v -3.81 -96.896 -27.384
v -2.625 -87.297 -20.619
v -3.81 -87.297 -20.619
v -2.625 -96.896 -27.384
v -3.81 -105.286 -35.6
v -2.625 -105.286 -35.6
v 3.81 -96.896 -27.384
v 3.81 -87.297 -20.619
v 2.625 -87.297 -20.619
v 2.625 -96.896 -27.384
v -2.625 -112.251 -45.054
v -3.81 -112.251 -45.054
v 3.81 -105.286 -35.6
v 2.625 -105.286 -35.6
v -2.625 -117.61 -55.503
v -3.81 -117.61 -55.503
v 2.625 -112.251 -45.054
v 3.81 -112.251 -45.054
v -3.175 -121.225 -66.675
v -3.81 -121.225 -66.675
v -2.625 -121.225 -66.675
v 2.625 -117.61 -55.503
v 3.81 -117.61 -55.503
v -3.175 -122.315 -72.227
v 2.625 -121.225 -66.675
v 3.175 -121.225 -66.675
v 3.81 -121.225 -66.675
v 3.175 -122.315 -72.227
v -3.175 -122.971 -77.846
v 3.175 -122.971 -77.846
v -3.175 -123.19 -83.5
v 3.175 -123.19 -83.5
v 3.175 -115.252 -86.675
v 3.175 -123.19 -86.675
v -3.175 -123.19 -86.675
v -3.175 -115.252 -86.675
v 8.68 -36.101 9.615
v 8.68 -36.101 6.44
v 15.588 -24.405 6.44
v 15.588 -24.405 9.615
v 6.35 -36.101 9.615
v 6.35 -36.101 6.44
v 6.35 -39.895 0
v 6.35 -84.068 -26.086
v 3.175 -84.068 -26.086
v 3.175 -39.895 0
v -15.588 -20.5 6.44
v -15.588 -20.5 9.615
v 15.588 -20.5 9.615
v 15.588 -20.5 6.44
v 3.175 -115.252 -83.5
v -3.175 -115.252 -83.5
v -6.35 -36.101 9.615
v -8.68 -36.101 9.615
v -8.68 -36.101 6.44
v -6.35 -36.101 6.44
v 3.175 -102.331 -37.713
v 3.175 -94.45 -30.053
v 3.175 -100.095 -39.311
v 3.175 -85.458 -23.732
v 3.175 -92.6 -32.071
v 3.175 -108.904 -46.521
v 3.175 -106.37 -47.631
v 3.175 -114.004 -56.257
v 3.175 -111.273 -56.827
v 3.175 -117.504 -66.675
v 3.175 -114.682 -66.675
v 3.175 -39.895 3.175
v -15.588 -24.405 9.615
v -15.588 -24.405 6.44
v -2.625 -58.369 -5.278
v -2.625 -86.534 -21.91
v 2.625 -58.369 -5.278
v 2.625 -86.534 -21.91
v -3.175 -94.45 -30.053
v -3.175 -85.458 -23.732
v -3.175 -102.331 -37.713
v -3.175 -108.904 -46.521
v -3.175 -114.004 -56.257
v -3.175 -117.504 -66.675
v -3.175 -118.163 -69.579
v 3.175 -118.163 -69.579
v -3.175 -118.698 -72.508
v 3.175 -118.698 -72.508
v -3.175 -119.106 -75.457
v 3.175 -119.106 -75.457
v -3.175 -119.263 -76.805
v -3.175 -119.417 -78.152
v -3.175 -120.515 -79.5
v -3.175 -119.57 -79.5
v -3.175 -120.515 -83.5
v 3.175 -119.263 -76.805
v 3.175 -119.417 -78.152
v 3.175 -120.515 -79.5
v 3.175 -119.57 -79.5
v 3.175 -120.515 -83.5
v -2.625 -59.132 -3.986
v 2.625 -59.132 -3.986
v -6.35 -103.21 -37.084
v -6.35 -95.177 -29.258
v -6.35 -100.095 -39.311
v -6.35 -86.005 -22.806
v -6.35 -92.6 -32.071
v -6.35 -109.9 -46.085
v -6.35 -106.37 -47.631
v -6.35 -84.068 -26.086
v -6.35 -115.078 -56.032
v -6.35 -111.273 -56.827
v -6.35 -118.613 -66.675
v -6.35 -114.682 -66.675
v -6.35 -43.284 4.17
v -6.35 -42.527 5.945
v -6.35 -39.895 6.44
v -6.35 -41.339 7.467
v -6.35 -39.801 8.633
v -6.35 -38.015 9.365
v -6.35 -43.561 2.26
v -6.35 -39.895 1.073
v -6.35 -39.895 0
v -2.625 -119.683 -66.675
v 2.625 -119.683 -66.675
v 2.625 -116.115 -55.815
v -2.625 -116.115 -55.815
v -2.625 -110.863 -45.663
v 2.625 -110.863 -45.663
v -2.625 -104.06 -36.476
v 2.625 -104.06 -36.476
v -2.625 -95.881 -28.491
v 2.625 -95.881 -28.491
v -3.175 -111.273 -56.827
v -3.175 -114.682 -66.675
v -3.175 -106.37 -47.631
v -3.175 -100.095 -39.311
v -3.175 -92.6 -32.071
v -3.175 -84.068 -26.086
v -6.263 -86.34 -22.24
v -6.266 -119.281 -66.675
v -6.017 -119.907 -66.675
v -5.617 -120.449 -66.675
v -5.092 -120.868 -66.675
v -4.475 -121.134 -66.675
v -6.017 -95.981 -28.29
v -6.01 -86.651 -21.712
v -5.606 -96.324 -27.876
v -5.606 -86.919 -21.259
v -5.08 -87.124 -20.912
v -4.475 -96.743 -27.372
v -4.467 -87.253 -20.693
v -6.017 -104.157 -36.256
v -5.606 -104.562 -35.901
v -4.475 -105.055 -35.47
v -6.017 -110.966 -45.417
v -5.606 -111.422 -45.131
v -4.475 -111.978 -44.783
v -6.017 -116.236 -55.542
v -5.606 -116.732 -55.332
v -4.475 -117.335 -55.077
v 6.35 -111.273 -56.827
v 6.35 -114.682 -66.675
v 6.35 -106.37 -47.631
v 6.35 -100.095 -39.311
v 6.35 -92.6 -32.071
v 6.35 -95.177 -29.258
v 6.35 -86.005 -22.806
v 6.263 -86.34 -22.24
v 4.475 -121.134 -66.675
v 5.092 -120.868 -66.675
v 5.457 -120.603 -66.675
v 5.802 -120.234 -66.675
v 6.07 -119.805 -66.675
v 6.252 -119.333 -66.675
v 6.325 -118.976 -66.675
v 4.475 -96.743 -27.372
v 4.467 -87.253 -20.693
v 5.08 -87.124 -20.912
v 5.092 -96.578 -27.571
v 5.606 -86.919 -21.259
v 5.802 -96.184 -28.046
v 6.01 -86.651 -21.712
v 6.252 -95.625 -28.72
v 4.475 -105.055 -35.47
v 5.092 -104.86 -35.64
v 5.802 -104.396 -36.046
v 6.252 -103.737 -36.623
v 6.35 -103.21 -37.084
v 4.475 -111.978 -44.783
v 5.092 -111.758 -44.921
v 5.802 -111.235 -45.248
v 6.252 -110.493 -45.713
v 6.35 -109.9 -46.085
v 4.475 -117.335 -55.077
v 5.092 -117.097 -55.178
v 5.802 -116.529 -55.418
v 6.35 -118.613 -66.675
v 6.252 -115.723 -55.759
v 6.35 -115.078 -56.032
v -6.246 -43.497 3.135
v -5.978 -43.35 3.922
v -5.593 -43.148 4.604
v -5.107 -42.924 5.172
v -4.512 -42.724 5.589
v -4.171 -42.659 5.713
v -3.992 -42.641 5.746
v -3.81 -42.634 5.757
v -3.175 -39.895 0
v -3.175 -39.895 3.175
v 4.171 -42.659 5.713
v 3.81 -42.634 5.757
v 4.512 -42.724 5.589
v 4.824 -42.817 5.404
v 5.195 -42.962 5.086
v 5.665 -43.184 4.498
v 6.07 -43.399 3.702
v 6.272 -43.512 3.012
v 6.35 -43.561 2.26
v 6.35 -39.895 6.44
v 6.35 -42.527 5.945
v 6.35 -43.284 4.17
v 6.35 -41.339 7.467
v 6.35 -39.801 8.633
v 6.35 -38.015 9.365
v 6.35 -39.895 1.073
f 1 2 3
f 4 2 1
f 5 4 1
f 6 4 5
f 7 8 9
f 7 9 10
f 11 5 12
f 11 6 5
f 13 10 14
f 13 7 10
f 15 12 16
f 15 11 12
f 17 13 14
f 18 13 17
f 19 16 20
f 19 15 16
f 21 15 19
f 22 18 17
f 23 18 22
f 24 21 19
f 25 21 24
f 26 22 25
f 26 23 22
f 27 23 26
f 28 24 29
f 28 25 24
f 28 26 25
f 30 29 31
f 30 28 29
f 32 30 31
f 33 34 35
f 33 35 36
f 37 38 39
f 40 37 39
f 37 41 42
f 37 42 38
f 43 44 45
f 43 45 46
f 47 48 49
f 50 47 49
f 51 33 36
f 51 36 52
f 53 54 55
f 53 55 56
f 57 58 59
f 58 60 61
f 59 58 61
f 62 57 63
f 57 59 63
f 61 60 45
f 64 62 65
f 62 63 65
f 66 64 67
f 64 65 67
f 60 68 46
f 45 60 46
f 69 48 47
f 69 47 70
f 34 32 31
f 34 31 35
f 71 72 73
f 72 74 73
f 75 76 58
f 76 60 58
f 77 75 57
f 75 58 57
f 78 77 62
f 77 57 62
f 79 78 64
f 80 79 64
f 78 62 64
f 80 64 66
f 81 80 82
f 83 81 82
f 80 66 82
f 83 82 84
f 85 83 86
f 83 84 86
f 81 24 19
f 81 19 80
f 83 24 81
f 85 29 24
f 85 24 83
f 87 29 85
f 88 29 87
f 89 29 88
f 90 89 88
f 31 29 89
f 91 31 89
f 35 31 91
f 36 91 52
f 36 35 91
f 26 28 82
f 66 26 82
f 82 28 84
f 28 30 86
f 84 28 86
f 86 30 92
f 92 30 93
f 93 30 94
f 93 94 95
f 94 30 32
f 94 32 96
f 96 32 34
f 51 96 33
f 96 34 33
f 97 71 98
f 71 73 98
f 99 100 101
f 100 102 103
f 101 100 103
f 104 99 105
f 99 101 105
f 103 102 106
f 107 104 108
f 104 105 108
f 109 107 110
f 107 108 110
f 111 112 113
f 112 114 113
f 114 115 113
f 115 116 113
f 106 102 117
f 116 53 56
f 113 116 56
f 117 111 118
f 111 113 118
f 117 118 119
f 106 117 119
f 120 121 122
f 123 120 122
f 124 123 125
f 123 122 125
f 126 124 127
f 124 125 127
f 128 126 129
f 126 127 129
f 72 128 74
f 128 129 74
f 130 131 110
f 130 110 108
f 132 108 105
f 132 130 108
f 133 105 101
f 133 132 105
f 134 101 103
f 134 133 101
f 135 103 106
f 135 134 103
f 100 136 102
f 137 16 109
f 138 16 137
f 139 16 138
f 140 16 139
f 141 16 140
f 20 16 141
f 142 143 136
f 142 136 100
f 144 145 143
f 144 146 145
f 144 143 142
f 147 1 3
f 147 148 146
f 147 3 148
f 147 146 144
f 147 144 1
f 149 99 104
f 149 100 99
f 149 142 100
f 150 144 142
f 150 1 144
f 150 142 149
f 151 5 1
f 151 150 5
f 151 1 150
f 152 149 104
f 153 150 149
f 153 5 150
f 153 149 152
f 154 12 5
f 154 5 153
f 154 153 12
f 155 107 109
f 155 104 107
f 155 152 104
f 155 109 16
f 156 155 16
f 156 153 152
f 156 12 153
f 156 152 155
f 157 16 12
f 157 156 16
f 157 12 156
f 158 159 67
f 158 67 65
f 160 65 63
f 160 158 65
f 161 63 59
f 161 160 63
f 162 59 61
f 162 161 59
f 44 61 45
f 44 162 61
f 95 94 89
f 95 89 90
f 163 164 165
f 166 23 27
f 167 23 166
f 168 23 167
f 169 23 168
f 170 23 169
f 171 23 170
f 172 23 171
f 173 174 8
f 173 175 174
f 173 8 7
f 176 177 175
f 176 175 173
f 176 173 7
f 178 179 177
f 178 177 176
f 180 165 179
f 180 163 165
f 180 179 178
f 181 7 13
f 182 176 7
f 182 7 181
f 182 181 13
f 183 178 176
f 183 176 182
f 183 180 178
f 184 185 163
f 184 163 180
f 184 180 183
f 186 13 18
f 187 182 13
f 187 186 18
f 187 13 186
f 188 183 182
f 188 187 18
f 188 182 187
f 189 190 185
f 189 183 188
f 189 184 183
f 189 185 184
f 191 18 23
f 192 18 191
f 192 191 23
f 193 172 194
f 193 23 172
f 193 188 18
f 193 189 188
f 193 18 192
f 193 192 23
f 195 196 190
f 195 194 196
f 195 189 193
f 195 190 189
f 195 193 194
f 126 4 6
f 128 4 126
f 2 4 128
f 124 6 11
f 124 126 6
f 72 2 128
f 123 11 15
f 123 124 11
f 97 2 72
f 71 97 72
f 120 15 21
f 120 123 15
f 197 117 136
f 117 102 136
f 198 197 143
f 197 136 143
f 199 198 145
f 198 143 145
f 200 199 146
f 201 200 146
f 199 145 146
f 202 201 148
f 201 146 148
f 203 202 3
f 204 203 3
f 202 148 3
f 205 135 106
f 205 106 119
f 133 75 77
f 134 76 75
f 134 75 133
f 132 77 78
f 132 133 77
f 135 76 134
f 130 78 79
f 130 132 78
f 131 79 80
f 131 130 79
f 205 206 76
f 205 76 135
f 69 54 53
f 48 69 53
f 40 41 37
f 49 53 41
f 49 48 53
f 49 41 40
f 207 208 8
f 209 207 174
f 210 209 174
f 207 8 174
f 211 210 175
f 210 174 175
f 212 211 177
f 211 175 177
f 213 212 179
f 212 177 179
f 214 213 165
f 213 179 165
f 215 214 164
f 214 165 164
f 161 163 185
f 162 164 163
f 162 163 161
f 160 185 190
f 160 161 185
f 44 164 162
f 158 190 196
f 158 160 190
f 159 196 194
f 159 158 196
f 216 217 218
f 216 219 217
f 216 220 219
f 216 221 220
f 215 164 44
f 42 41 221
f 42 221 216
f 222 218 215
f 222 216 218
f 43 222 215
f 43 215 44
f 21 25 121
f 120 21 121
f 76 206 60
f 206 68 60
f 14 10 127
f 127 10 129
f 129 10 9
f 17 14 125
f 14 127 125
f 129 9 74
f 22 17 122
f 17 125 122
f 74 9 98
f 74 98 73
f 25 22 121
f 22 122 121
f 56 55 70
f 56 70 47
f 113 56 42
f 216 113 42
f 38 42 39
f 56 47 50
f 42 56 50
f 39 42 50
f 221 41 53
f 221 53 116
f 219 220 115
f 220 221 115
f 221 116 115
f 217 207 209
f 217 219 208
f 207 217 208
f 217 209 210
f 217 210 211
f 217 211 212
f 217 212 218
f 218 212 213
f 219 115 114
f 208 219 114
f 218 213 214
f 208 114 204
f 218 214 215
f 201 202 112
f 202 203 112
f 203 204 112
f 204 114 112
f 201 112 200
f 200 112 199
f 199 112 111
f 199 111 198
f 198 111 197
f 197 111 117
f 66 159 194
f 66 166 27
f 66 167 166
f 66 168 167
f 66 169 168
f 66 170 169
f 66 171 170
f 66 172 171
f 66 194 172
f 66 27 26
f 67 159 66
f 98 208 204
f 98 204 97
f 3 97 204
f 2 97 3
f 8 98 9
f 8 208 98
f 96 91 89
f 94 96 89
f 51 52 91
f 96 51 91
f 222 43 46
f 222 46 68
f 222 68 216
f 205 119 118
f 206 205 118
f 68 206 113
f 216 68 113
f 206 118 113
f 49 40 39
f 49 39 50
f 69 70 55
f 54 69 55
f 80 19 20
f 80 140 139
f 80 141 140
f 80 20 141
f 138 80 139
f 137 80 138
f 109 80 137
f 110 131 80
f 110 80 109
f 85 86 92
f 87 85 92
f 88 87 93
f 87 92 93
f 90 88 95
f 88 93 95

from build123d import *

# Parameters (mm, degrees)
SKETCH5_W           = 12.880016042
SKETCH5_H           = 15.834691301
CUT_EXTRUDE2_DEPTH  = 7.62
CUT_EXTRUDE6_REACH  = 62
SKETCH11_W          = 3.175
SKETCH11_H          = 3.175
BOSS_EXTRUDE1_DEPTH = 6.35
CUT_EXTRUDE4_DEPTH  = 3.175
SKETCH10_W          = 4
SKETCH10_H          = 0.5
CUT_EXTRUDE5_DEPTH  = 37.349999944
CUT_EXTRUDE7_DEPTH  = 40.64
BOSS_EXTRUDE3_DEPTH = 12.7
SKETCH19_W          = 21.319602533
SKETCH19_H          = 36.10119369
CUT_EXTRUDE10_DEPTH = 13.7
SKETCH21_W          = 9.2375
SKETCH21_H          = 12.42619369
SKETCH21_H_2        = 3.175
BOSS_EXTRUDE4_DEPTH = 3.175
SKETCH17_W          = 3.175
SKETCH17_H          = 52.572237063
CUT_EXTRUDE9_DEPTH  = 20
CUT_EXTRUDE11_DEPTH = 4.175
CUT_EXTRUDE12_DEPTH = 2.625
FILLET1_R           = 2.54


with BuildPart() as part:
    # Sketch2 → Revolve1 (revolve)
    with BuildSketch(Plane(origin=(0, 0, 0), x_dir=(0, 0, -1), z_dir=(1, 0, 0))):
        Polygon((0, -50.8), (-29.999999944, 0), (0, 0), align=None)
    revolve(axis=Axis((0, 0, 0), (0, -1, 0)))

    # Sketch4 → Cut-Revolve1 (revolve, cut)
    with BuildSketch(Plane(origin=(0, 0, 0), x_dir=(0, 0, -1), z_dir=(1, 0, 0))):
        Polygon((0, -45.72), (-24.919999944, 0), (0, 0), align=None)
    revolve(axis=Axis((0, 16.11457811, 0), (0, -1, 0)), mode=Mode.SUBTRACT)

    # Sketch5 → Cut-Extrude2 (cut, symmetric)
    with BuildSketch(Plane(origin=(0, 0, 0), x_dir=(0, 0, -1), z_dir=(1, 0, 0))):
        with Locations((0, -47.812265381)):
            Rectangle(SKETCH5_W, SKETCH5_H)
    extrude(amount=CUT_EXTRUDE2_DEPTH, both=True, mode=Mode.SUBTRACT)

    # Sketch11 → Cut-Extrude6 (cut, up to next)
    with BuildSketch(Plane.XY.offset(29.999999944), mode=Mode.PRIVATE) as cut_extrude6_sk1:
        with Locations((4.7625, -1.5875)):
            Rectangle(SKETCH11_W, SKETCH11_H)
    cut_extrude6_tool1 = extrude(cut_extrude6_sk1.sketch, amount=-CUT_EXTRUDE6_REACH, mode=Mode.PRIVATE) & part.part
    add(cut_extrude6_tool1.solids().sort_by_distance((4.7625, -1.5875, 30))[0], mode=Mode.SUBTRACT)
    # Sketch11 → Cut-Extrude6 (cut, up to next)
    with BuildSketch(Plane.XY.offset(29.999999944), mode=Mode.PRIVATE) as cut_extrude6_sk2:
        with Locations((-4.7625, -1.5875)):
            Rectangle(SKETCH11_W, SKETCH11_H)
    cut_extrude6_tool2 = extrude(cut_extrude6_sk2.sketch, amount=-CUT_EXTRUDE6_REACH, mode=Mode.PRIVATE) & part.part
    add(cut_extrude6_tool2.solids().sort_by_distance((-4.7625, -1.5875, 30))[0], mode=Mode.SUBTRACT)

    # Sketch6 → Boss-Extrude1 (add, symmetric)
    with BuildSketch(Plane(origin=(0, 0, 0), x_dir=(0, 0, -1), z_dir=(1, 0, 0))):
        with BuildLine():
            Line((0, -39.89491973), (-7.374618631, -39.89491973))
            Line((-7.374618631, -39.89491973), (20.618728491, -87.296987611))
            ThreePointArc((20.618728491, -87.296987611), (38.876637468, -107.970587413), (63.5, -120.397935747))
            ThreePointArc((63.5, -120.397935747), (73.403024923, -122.48861576), (83.5, -123.19))
            Line((83.5, -123.19), (86.675, -123.19))
            Line((86.675, -123.19), (86.675, -115.2525))
            Line((86.675, -115.2525), (83.5, -115.2525))
            Line((83.5, -115.2525), (83.5, -116.84))
            ThreePointArc((83.5, -116.84), (50.445813134, -108.070287624), (26.086468861, -84.068007083))
            Line((26.086468861, -84.068007083), (0, -39.89491973))
        make_face()
        Polygon((-30.934610553, 0), (-7.374618631, -39.89491973), (0, -39.89491973), (-23.559991923, 0), align=None)
    extrude(amount=BOSS_EXTRUDE1_DEPTH, both=True)

    # Sketch7 → Cut-Extrude4 (cut)
    with BuildSketch(Plane(origin=(0, 0, 0), x_dir=(0, 0, -1), z_dir=(1, 0, 0))):
        with BuildLine():
            Line((-3.175, -39.89491973), (23.732438565, -85.458182452))
            ThreePointArc((23.732438565, -85.458182452), (45.650201216, -108.346121156), (75.457309, -119.106343424))
            ThreePointArc((75.457309, -119.106343424), (79.477830242, -119.567967375), (83.5, -120.015))
            Line((83.5, -120.015), (83.5, -116.84))
            ThreePointArc((83.5, -116.84), (50.445813134, -108.070287624), (26.086468861, -84.068007083))
            Line((26.086468861, -84.068007083), (-23.559991923, 0))
            Line((-23.559991923, 0), (-26.734991923, 0))
            Line((-26.734991923, 0), (-3.175, -39.89491973))
        make_face()
    cut_extrude4 = extrude(amount=-CUT_EXTRUDE4_DEPTH, mode=Mode.SUBTRACT)

    # Mirror1: Cut-Extrude4 across plane
    add(cut_extrude4.mirror(Plane(origin=(0, 0, 0), x_dir=(0, 0, 1), z_dir=(1, 0, 0))), mode=Mode.SUBTRACT)

    # Sketch9 → Cut-Revolve2 (revolve, cut)
    with BuildSketch(Plane(origin=(0, 0, 0), x_dir=(0, 0, -1), z_dir=(1, 0, 0))):
        Polygon((0, 0), (-24.9199908, 0), (-0.536470716, -39.89491973), (0, -39.89491973), align=None)
    revolve(axis=Axis((0, 16.11457811, 0), (0, -1, 0)), mode=Mode.SUBTRACT)

    # Sketch10 → Cut-Extrude5 (cut, through all)
    with BuildSketch(Plane.ZY.offset(6.35)):
        with BuildLine():
            Line((-79.5, -120.015), (-79.5, -116.719911574))
            ThreePointArc((-79.5, -116.719911574), (-81.499098876, -116.809971132), (-83.5, -116.84))
            Line((-83.5, -116.84), (-83.5, -120.015))
            Line((-83.5, -120.015), (-79.5, -120.015))
        make_face()
        with Locations((-81.5, -120.265)):
            Rectangle(SKETCH10_W, SKETCH10_H)
    extrude(amount=-CUT_EXTRUDE5_DEPTH, mode=Mode.SUBTRACT)

    # Sketch12 → Cut-Extrude7 (cut, symmetric)
    with BuildSketch(Plane.ZY):
        Polygon((30, 0), (-29.999999944, 0), (-29.999999944, -39.89491973), (-6.440008021, -39.89491973), (6.44000802, -39.89491973), align=None)
    extrude(amount=CUT_EXTRUDE7_DEPTH, both=True, mode=Mode.SUBTRACT)

    # Sketch18 → Boss-Extrude3 (add)
    with BuildSketch(Plane.ZY.offset(6.35)):
        with BuildLine():
            Line((6.44000802, -39.89491973), (6.44000802, -20.5))
            Line((6.44000802, -20.5), (9.61500802, -20.5))
            Line((9.61500802, -20.5), (9.61500802, -34.5185864))
            Line((9.61500802, -34.5185864), (9.61500802, -36.10119369))
            ThreePointArc((9.61500802, -36.10119369), (8.57844205, -39.89491973), (5.756782033, -42.634456374))
            Line((5.756782033, -42.634456374), (6.44000802, -41.477527034))
            Line((6.44000802, -41.477527034), (6.44000802, -39.89491973))
        make_face()
    extrude(amount=-BOSS_EXTRUDE3_DEPTH)

    # Sketch19 → Cut-Extrude10 (cut, through all)
    with BuildSketch(Plane.ZY.offset(6.35)):
        with Locations((20.274809287, -18.050596845)):
            Rectangle(SKETCH19_W, SKETCH19_H)
    extrude(amount=-CUT_EXTRUDE10_DEPTH, mode=Mode.SUBTRACT)

    # Sketch21 → Boss-Extrude4 (add)
    with BuildSketch(Plane.XY.offset(9.61500802)):
        with Locations((-10.96875, -29.888096845)):
            Rectangle(SKETCH21_W, SKETCH21_H)
        with Locations((10.96875, -29.888096845)):
            Rectangle(SKETCH21_W, SKETCH21_H)
        with Locations((10.96875, -22.0875)):
            Rectangle(SKETCH21_W, SKETCH21_H_2)
        with Locations((-10.96875, -22.0875)):
            Rectangle(SKETCH21_W, SKETCH21_H_2)
    extrude(amount=-BOSS_EXTRUDE4_DEPTH)

    # Sketch17 → Cut-Extrude9 (cut)
    with BuildSketch(Plane(origin=(0, 0, -86.675), x_dir=(-1, 0, 0), z_dir=(0, 0, -1))):
        with Locations((-4.7625, -96.903881469)):
            Rectangle(SKETCH17_W, SKETCH17_H)
        with Locations((4.7625, -96.903881469)):
            Rectangle(SKETCH17_W, SKETCH17_H)
    extrude(amount=-CUT_EXTRUDE9_DEPTH, mode=Mode.SUBTRACT)

    # Sketch22 → Cut-Extrude11 (cut, through all)
    with BuildSketch(Plane(origin=(0, 0, 6.44000802), x_dir=(-1, 0, 0), z_dir=(0, 0, -1))):
        Polygon((-15.5875, -24.405166536), (-15.5875, -36.10119369), (-8.680397482, -36.10119369), align=None)
        Polygon((15.5875, -24.405166536), (8.680397482, -36.10119369), (15.5875, -36.10119369), align=None)
    extrude(amount=-CUT_EXTRUDE11_DEPTH, mode=Mode.SUBTRACT)

    # Sketch24 → Cut-Extrude12 (cut, symmetric)
    with BuildSketch(Plane(origin=(0, 0, 0), x_dir=(0, 0, -1), z_dir=(1, 0, 0))):
        with BuildLine():
            Line((3.985949874, -59.1321491), (20.618728491, -87.296987611))
            ThreePointArc((20.618728491, -87.296987611), (40.186529767, -108.958439573), (66.675, -121.22539896))
            Line((66.675, -121.22539896), (66.675, -119.683023005))
            ThreePointArc((66.675, -119.683023005), (40.93327594, -107.645198887), (21.910320704, -86.534236305))
            Line((21.910320704, -86.534236305), (5.277542087, -58.369397794))
            Line((5.277542087, -58.369397794), (3.985949874, -59.1321491))
        make_face()
    extrude(amount=CUT_EXTRUDE12_DEPTH, both=True, mode=Mode.SUBTRACT)

    # Fillet1
    fillet1_edges = [part.edges().sort_by_distance(p)[0] for p in [
        (6.35, -64.965721992, -7.430973229),
        (6.35, -108.958439573, -40.186529767),
        (-6.35, -64.965721992, -7.430973229),
        (-6.35, -108.958439573, -40.186529767),
    ]]
    fillet(fillet1_edges, radius=FILLET1_R)


solid = part.part
